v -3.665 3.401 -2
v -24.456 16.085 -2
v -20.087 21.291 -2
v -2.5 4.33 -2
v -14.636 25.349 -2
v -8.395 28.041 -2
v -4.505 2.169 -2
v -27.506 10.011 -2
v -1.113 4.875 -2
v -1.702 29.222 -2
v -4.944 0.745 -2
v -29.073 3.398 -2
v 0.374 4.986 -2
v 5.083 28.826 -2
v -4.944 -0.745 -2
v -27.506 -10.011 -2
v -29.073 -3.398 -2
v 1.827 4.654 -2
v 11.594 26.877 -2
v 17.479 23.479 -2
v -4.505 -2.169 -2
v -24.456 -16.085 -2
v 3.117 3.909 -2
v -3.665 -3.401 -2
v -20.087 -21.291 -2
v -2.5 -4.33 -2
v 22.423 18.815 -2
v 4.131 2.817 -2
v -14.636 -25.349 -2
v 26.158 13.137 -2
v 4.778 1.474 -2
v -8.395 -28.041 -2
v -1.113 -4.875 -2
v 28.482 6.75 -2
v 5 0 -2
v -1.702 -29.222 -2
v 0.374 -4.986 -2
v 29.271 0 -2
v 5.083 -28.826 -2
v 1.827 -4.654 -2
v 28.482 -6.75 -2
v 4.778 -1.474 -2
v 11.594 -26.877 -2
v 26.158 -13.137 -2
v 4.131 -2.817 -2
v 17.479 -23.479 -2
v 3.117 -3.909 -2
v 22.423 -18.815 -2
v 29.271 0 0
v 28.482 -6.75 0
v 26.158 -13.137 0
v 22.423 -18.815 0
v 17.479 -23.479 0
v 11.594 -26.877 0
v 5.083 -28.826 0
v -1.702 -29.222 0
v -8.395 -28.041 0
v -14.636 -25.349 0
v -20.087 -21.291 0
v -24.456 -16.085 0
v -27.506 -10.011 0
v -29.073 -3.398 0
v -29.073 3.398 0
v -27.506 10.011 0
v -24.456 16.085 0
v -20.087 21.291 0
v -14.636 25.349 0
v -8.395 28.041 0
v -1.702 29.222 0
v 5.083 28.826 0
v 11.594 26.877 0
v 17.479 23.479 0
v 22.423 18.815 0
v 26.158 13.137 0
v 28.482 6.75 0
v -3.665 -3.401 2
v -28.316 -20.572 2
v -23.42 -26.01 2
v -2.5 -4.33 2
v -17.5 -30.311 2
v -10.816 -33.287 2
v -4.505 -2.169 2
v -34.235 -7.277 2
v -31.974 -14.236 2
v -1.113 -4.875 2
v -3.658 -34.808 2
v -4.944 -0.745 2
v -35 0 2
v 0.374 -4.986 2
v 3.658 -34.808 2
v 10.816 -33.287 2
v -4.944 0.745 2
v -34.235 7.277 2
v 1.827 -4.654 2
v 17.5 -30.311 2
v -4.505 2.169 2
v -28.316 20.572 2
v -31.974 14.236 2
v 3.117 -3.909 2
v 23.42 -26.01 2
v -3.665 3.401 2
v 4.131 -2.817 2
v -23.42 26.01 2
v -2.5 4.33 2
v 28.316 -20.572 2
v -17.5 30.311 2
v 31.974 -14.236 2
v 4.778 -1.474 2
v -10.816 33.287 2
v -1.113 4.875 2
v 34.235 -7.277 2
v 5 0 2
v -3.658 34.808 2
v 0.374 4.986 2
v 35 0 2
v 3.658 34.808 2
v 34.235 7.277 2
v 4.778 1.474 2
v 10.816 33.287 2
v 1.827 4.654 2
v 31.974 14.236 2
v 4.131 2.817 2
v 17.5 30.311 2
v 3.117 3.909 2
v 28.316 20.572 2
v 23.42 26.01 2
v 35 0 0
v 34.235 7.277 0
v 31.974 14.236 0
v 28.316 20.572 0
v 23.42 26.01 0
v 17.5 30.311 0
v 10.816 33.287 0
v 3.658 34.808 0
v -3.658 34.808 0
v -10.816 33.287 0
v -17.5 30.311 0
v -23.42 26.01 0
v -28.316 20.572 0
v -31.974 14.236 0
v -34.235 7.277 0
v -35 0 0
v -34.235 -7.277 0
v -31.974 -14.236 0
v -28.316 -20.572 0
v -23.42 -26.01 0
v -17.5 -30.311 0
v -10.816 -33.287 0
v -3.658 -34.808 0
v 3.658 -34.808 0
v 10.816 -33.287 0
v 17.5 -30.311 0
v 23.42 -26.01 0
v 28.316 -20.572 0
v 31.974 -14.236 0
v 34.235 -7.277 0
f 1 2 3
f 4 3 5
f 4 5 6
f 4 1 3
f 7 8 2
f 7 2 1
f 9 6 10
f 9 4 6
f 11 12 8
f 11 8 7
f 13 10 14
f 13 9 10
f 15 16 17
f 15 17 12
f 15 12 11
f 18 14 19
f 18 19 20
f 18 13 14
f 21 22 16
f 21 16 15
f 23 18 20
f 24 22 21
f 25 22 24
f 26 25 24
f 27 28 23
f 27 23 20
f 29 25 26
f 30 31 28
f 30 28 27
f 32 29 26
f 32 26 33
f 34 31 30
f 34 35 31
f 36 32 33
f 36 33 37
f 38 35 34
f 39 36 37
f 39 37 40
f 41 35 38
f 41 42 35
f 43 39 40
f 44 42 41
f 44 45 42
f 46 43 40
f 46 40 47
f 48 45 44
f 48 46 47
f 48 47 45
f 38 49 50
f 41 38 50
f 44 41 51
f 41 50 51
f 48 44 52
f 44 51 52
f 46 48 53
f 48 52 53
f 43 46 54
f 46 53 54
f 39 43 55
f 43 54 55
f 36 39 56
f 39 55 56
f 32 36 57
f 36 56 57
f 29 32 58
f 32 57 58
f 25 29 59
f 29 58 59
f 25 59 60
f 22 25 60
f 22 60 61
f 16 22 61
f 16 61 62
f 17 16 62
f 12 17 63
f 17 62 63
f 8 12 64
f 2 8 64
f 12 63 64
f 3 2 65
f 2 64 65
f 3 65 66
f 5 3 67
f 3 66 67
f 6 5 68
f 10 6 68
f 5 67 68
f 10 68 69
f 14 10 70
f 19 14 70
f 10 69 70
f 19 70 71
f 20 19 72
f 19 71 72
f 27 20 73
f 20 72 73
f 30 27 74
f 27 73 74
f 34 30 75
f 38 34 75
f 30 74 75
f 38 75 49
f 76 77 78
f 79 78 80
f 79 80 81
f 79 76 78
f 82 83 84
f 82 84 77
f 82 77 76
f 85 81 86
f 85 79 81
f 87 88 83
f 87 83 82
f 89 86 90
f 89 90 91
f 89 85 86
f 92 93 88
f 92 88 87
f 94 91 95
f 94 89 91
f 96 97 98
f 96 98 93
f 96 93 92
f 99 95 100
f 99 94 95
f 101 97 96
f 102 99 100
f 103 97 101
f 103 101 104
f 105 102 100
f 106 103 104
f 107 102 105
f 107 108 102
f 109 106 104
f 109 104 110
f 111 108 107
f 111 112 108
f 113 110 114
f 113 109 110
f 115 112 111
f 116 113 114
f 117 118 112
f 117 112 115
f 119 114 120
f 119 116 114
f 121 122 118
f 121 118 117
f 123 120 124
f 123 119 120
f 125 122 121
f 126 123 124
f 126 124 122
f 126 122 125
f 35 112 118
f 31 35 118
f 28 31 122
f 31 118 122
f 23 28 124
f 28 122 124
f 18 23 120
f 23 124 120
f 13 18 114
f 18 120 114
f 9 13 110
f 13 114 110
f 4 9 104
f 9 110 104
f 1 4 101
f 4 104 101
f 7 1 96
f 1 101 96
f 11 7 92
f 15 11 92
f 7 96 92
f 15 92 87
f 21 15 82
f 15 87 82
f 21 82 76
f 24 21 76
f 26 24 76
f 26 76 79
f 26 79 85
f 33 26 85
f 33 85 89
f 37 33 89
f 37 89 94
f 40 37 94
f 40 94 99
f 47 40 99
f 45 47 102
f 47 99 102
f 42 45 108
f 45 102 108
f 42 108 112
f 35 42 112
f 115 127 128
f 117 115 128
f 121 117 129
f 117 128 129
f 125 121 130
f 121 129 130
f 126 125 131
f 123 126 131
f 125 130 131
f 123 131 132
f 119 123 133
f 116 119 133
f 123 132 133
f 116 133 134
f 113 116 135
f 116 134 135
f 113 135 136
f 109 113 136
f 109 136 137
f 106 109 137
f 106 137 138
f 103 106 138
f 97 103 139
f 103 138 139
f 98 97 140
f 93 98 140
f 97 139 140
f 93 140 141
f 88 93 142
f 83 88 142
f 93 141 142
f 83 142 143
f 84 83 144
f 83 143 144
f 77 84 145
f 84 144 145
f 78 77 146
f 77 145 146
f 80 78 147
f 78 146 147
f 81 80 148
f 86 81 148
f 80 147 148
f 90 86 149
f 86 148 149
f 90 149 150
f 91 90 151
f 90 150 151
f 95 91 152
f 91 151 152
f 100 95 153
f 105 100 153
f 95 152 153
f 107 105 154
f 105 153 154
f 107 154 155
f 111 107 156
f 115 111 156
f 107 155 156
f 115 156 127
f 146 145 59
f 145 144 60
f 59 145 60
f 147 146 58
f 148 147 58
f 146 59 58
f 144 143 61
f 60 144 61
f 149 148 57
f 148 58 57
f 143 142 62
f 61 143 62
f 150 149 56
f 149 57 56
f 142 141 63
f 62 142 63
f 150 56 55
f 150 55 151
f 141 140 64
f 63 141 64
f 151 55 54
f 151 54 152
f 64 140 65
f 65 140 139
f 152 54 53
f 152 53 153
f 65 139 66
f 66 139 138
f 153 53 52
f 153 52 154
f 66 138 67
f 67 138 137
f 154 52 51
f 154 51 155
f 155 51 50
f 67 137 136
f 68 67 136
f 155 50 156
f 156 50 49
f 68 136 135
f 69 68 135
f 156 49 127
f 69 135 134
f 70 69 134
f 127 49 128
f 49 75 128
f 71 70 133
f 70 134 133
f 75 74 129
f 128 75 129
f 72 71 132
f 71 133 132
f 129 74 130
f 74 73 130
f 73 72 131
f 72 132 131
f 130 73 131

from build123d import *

# Parameters (mm, degrees)
F0_R     = 35
F1_DEPTH = 2
F2_R     = 29.271045
F3_DEPTH = 2
F4_R     = 5
F5_DEPTH = 4


with BuildPart() as f1:
    # F0 (on Top) → F1 (new body)
    with BuildSketch(Plane.XY):
        Circle(F0_R)
    extrude(amount=F1_DEPTH)

    # F2 (on face) → F3 (join)
    with BuildSketch(Plane(origin=(0, 0, 0), x_dir=(1, 0, 0), z_dir=(0, 0, -1))):
        Circle(F2_R)
    extrude(amount=F3_DEPTH)

    # F4 (on face) → F5 (cut, through all)
    with BuildSketch(Plane.XY.offset(2)):
        Circle(F4_R)
    extrude(amount=-F5_DEPTH, mode=Mode.SUBTRACT)


solid = f1.part
